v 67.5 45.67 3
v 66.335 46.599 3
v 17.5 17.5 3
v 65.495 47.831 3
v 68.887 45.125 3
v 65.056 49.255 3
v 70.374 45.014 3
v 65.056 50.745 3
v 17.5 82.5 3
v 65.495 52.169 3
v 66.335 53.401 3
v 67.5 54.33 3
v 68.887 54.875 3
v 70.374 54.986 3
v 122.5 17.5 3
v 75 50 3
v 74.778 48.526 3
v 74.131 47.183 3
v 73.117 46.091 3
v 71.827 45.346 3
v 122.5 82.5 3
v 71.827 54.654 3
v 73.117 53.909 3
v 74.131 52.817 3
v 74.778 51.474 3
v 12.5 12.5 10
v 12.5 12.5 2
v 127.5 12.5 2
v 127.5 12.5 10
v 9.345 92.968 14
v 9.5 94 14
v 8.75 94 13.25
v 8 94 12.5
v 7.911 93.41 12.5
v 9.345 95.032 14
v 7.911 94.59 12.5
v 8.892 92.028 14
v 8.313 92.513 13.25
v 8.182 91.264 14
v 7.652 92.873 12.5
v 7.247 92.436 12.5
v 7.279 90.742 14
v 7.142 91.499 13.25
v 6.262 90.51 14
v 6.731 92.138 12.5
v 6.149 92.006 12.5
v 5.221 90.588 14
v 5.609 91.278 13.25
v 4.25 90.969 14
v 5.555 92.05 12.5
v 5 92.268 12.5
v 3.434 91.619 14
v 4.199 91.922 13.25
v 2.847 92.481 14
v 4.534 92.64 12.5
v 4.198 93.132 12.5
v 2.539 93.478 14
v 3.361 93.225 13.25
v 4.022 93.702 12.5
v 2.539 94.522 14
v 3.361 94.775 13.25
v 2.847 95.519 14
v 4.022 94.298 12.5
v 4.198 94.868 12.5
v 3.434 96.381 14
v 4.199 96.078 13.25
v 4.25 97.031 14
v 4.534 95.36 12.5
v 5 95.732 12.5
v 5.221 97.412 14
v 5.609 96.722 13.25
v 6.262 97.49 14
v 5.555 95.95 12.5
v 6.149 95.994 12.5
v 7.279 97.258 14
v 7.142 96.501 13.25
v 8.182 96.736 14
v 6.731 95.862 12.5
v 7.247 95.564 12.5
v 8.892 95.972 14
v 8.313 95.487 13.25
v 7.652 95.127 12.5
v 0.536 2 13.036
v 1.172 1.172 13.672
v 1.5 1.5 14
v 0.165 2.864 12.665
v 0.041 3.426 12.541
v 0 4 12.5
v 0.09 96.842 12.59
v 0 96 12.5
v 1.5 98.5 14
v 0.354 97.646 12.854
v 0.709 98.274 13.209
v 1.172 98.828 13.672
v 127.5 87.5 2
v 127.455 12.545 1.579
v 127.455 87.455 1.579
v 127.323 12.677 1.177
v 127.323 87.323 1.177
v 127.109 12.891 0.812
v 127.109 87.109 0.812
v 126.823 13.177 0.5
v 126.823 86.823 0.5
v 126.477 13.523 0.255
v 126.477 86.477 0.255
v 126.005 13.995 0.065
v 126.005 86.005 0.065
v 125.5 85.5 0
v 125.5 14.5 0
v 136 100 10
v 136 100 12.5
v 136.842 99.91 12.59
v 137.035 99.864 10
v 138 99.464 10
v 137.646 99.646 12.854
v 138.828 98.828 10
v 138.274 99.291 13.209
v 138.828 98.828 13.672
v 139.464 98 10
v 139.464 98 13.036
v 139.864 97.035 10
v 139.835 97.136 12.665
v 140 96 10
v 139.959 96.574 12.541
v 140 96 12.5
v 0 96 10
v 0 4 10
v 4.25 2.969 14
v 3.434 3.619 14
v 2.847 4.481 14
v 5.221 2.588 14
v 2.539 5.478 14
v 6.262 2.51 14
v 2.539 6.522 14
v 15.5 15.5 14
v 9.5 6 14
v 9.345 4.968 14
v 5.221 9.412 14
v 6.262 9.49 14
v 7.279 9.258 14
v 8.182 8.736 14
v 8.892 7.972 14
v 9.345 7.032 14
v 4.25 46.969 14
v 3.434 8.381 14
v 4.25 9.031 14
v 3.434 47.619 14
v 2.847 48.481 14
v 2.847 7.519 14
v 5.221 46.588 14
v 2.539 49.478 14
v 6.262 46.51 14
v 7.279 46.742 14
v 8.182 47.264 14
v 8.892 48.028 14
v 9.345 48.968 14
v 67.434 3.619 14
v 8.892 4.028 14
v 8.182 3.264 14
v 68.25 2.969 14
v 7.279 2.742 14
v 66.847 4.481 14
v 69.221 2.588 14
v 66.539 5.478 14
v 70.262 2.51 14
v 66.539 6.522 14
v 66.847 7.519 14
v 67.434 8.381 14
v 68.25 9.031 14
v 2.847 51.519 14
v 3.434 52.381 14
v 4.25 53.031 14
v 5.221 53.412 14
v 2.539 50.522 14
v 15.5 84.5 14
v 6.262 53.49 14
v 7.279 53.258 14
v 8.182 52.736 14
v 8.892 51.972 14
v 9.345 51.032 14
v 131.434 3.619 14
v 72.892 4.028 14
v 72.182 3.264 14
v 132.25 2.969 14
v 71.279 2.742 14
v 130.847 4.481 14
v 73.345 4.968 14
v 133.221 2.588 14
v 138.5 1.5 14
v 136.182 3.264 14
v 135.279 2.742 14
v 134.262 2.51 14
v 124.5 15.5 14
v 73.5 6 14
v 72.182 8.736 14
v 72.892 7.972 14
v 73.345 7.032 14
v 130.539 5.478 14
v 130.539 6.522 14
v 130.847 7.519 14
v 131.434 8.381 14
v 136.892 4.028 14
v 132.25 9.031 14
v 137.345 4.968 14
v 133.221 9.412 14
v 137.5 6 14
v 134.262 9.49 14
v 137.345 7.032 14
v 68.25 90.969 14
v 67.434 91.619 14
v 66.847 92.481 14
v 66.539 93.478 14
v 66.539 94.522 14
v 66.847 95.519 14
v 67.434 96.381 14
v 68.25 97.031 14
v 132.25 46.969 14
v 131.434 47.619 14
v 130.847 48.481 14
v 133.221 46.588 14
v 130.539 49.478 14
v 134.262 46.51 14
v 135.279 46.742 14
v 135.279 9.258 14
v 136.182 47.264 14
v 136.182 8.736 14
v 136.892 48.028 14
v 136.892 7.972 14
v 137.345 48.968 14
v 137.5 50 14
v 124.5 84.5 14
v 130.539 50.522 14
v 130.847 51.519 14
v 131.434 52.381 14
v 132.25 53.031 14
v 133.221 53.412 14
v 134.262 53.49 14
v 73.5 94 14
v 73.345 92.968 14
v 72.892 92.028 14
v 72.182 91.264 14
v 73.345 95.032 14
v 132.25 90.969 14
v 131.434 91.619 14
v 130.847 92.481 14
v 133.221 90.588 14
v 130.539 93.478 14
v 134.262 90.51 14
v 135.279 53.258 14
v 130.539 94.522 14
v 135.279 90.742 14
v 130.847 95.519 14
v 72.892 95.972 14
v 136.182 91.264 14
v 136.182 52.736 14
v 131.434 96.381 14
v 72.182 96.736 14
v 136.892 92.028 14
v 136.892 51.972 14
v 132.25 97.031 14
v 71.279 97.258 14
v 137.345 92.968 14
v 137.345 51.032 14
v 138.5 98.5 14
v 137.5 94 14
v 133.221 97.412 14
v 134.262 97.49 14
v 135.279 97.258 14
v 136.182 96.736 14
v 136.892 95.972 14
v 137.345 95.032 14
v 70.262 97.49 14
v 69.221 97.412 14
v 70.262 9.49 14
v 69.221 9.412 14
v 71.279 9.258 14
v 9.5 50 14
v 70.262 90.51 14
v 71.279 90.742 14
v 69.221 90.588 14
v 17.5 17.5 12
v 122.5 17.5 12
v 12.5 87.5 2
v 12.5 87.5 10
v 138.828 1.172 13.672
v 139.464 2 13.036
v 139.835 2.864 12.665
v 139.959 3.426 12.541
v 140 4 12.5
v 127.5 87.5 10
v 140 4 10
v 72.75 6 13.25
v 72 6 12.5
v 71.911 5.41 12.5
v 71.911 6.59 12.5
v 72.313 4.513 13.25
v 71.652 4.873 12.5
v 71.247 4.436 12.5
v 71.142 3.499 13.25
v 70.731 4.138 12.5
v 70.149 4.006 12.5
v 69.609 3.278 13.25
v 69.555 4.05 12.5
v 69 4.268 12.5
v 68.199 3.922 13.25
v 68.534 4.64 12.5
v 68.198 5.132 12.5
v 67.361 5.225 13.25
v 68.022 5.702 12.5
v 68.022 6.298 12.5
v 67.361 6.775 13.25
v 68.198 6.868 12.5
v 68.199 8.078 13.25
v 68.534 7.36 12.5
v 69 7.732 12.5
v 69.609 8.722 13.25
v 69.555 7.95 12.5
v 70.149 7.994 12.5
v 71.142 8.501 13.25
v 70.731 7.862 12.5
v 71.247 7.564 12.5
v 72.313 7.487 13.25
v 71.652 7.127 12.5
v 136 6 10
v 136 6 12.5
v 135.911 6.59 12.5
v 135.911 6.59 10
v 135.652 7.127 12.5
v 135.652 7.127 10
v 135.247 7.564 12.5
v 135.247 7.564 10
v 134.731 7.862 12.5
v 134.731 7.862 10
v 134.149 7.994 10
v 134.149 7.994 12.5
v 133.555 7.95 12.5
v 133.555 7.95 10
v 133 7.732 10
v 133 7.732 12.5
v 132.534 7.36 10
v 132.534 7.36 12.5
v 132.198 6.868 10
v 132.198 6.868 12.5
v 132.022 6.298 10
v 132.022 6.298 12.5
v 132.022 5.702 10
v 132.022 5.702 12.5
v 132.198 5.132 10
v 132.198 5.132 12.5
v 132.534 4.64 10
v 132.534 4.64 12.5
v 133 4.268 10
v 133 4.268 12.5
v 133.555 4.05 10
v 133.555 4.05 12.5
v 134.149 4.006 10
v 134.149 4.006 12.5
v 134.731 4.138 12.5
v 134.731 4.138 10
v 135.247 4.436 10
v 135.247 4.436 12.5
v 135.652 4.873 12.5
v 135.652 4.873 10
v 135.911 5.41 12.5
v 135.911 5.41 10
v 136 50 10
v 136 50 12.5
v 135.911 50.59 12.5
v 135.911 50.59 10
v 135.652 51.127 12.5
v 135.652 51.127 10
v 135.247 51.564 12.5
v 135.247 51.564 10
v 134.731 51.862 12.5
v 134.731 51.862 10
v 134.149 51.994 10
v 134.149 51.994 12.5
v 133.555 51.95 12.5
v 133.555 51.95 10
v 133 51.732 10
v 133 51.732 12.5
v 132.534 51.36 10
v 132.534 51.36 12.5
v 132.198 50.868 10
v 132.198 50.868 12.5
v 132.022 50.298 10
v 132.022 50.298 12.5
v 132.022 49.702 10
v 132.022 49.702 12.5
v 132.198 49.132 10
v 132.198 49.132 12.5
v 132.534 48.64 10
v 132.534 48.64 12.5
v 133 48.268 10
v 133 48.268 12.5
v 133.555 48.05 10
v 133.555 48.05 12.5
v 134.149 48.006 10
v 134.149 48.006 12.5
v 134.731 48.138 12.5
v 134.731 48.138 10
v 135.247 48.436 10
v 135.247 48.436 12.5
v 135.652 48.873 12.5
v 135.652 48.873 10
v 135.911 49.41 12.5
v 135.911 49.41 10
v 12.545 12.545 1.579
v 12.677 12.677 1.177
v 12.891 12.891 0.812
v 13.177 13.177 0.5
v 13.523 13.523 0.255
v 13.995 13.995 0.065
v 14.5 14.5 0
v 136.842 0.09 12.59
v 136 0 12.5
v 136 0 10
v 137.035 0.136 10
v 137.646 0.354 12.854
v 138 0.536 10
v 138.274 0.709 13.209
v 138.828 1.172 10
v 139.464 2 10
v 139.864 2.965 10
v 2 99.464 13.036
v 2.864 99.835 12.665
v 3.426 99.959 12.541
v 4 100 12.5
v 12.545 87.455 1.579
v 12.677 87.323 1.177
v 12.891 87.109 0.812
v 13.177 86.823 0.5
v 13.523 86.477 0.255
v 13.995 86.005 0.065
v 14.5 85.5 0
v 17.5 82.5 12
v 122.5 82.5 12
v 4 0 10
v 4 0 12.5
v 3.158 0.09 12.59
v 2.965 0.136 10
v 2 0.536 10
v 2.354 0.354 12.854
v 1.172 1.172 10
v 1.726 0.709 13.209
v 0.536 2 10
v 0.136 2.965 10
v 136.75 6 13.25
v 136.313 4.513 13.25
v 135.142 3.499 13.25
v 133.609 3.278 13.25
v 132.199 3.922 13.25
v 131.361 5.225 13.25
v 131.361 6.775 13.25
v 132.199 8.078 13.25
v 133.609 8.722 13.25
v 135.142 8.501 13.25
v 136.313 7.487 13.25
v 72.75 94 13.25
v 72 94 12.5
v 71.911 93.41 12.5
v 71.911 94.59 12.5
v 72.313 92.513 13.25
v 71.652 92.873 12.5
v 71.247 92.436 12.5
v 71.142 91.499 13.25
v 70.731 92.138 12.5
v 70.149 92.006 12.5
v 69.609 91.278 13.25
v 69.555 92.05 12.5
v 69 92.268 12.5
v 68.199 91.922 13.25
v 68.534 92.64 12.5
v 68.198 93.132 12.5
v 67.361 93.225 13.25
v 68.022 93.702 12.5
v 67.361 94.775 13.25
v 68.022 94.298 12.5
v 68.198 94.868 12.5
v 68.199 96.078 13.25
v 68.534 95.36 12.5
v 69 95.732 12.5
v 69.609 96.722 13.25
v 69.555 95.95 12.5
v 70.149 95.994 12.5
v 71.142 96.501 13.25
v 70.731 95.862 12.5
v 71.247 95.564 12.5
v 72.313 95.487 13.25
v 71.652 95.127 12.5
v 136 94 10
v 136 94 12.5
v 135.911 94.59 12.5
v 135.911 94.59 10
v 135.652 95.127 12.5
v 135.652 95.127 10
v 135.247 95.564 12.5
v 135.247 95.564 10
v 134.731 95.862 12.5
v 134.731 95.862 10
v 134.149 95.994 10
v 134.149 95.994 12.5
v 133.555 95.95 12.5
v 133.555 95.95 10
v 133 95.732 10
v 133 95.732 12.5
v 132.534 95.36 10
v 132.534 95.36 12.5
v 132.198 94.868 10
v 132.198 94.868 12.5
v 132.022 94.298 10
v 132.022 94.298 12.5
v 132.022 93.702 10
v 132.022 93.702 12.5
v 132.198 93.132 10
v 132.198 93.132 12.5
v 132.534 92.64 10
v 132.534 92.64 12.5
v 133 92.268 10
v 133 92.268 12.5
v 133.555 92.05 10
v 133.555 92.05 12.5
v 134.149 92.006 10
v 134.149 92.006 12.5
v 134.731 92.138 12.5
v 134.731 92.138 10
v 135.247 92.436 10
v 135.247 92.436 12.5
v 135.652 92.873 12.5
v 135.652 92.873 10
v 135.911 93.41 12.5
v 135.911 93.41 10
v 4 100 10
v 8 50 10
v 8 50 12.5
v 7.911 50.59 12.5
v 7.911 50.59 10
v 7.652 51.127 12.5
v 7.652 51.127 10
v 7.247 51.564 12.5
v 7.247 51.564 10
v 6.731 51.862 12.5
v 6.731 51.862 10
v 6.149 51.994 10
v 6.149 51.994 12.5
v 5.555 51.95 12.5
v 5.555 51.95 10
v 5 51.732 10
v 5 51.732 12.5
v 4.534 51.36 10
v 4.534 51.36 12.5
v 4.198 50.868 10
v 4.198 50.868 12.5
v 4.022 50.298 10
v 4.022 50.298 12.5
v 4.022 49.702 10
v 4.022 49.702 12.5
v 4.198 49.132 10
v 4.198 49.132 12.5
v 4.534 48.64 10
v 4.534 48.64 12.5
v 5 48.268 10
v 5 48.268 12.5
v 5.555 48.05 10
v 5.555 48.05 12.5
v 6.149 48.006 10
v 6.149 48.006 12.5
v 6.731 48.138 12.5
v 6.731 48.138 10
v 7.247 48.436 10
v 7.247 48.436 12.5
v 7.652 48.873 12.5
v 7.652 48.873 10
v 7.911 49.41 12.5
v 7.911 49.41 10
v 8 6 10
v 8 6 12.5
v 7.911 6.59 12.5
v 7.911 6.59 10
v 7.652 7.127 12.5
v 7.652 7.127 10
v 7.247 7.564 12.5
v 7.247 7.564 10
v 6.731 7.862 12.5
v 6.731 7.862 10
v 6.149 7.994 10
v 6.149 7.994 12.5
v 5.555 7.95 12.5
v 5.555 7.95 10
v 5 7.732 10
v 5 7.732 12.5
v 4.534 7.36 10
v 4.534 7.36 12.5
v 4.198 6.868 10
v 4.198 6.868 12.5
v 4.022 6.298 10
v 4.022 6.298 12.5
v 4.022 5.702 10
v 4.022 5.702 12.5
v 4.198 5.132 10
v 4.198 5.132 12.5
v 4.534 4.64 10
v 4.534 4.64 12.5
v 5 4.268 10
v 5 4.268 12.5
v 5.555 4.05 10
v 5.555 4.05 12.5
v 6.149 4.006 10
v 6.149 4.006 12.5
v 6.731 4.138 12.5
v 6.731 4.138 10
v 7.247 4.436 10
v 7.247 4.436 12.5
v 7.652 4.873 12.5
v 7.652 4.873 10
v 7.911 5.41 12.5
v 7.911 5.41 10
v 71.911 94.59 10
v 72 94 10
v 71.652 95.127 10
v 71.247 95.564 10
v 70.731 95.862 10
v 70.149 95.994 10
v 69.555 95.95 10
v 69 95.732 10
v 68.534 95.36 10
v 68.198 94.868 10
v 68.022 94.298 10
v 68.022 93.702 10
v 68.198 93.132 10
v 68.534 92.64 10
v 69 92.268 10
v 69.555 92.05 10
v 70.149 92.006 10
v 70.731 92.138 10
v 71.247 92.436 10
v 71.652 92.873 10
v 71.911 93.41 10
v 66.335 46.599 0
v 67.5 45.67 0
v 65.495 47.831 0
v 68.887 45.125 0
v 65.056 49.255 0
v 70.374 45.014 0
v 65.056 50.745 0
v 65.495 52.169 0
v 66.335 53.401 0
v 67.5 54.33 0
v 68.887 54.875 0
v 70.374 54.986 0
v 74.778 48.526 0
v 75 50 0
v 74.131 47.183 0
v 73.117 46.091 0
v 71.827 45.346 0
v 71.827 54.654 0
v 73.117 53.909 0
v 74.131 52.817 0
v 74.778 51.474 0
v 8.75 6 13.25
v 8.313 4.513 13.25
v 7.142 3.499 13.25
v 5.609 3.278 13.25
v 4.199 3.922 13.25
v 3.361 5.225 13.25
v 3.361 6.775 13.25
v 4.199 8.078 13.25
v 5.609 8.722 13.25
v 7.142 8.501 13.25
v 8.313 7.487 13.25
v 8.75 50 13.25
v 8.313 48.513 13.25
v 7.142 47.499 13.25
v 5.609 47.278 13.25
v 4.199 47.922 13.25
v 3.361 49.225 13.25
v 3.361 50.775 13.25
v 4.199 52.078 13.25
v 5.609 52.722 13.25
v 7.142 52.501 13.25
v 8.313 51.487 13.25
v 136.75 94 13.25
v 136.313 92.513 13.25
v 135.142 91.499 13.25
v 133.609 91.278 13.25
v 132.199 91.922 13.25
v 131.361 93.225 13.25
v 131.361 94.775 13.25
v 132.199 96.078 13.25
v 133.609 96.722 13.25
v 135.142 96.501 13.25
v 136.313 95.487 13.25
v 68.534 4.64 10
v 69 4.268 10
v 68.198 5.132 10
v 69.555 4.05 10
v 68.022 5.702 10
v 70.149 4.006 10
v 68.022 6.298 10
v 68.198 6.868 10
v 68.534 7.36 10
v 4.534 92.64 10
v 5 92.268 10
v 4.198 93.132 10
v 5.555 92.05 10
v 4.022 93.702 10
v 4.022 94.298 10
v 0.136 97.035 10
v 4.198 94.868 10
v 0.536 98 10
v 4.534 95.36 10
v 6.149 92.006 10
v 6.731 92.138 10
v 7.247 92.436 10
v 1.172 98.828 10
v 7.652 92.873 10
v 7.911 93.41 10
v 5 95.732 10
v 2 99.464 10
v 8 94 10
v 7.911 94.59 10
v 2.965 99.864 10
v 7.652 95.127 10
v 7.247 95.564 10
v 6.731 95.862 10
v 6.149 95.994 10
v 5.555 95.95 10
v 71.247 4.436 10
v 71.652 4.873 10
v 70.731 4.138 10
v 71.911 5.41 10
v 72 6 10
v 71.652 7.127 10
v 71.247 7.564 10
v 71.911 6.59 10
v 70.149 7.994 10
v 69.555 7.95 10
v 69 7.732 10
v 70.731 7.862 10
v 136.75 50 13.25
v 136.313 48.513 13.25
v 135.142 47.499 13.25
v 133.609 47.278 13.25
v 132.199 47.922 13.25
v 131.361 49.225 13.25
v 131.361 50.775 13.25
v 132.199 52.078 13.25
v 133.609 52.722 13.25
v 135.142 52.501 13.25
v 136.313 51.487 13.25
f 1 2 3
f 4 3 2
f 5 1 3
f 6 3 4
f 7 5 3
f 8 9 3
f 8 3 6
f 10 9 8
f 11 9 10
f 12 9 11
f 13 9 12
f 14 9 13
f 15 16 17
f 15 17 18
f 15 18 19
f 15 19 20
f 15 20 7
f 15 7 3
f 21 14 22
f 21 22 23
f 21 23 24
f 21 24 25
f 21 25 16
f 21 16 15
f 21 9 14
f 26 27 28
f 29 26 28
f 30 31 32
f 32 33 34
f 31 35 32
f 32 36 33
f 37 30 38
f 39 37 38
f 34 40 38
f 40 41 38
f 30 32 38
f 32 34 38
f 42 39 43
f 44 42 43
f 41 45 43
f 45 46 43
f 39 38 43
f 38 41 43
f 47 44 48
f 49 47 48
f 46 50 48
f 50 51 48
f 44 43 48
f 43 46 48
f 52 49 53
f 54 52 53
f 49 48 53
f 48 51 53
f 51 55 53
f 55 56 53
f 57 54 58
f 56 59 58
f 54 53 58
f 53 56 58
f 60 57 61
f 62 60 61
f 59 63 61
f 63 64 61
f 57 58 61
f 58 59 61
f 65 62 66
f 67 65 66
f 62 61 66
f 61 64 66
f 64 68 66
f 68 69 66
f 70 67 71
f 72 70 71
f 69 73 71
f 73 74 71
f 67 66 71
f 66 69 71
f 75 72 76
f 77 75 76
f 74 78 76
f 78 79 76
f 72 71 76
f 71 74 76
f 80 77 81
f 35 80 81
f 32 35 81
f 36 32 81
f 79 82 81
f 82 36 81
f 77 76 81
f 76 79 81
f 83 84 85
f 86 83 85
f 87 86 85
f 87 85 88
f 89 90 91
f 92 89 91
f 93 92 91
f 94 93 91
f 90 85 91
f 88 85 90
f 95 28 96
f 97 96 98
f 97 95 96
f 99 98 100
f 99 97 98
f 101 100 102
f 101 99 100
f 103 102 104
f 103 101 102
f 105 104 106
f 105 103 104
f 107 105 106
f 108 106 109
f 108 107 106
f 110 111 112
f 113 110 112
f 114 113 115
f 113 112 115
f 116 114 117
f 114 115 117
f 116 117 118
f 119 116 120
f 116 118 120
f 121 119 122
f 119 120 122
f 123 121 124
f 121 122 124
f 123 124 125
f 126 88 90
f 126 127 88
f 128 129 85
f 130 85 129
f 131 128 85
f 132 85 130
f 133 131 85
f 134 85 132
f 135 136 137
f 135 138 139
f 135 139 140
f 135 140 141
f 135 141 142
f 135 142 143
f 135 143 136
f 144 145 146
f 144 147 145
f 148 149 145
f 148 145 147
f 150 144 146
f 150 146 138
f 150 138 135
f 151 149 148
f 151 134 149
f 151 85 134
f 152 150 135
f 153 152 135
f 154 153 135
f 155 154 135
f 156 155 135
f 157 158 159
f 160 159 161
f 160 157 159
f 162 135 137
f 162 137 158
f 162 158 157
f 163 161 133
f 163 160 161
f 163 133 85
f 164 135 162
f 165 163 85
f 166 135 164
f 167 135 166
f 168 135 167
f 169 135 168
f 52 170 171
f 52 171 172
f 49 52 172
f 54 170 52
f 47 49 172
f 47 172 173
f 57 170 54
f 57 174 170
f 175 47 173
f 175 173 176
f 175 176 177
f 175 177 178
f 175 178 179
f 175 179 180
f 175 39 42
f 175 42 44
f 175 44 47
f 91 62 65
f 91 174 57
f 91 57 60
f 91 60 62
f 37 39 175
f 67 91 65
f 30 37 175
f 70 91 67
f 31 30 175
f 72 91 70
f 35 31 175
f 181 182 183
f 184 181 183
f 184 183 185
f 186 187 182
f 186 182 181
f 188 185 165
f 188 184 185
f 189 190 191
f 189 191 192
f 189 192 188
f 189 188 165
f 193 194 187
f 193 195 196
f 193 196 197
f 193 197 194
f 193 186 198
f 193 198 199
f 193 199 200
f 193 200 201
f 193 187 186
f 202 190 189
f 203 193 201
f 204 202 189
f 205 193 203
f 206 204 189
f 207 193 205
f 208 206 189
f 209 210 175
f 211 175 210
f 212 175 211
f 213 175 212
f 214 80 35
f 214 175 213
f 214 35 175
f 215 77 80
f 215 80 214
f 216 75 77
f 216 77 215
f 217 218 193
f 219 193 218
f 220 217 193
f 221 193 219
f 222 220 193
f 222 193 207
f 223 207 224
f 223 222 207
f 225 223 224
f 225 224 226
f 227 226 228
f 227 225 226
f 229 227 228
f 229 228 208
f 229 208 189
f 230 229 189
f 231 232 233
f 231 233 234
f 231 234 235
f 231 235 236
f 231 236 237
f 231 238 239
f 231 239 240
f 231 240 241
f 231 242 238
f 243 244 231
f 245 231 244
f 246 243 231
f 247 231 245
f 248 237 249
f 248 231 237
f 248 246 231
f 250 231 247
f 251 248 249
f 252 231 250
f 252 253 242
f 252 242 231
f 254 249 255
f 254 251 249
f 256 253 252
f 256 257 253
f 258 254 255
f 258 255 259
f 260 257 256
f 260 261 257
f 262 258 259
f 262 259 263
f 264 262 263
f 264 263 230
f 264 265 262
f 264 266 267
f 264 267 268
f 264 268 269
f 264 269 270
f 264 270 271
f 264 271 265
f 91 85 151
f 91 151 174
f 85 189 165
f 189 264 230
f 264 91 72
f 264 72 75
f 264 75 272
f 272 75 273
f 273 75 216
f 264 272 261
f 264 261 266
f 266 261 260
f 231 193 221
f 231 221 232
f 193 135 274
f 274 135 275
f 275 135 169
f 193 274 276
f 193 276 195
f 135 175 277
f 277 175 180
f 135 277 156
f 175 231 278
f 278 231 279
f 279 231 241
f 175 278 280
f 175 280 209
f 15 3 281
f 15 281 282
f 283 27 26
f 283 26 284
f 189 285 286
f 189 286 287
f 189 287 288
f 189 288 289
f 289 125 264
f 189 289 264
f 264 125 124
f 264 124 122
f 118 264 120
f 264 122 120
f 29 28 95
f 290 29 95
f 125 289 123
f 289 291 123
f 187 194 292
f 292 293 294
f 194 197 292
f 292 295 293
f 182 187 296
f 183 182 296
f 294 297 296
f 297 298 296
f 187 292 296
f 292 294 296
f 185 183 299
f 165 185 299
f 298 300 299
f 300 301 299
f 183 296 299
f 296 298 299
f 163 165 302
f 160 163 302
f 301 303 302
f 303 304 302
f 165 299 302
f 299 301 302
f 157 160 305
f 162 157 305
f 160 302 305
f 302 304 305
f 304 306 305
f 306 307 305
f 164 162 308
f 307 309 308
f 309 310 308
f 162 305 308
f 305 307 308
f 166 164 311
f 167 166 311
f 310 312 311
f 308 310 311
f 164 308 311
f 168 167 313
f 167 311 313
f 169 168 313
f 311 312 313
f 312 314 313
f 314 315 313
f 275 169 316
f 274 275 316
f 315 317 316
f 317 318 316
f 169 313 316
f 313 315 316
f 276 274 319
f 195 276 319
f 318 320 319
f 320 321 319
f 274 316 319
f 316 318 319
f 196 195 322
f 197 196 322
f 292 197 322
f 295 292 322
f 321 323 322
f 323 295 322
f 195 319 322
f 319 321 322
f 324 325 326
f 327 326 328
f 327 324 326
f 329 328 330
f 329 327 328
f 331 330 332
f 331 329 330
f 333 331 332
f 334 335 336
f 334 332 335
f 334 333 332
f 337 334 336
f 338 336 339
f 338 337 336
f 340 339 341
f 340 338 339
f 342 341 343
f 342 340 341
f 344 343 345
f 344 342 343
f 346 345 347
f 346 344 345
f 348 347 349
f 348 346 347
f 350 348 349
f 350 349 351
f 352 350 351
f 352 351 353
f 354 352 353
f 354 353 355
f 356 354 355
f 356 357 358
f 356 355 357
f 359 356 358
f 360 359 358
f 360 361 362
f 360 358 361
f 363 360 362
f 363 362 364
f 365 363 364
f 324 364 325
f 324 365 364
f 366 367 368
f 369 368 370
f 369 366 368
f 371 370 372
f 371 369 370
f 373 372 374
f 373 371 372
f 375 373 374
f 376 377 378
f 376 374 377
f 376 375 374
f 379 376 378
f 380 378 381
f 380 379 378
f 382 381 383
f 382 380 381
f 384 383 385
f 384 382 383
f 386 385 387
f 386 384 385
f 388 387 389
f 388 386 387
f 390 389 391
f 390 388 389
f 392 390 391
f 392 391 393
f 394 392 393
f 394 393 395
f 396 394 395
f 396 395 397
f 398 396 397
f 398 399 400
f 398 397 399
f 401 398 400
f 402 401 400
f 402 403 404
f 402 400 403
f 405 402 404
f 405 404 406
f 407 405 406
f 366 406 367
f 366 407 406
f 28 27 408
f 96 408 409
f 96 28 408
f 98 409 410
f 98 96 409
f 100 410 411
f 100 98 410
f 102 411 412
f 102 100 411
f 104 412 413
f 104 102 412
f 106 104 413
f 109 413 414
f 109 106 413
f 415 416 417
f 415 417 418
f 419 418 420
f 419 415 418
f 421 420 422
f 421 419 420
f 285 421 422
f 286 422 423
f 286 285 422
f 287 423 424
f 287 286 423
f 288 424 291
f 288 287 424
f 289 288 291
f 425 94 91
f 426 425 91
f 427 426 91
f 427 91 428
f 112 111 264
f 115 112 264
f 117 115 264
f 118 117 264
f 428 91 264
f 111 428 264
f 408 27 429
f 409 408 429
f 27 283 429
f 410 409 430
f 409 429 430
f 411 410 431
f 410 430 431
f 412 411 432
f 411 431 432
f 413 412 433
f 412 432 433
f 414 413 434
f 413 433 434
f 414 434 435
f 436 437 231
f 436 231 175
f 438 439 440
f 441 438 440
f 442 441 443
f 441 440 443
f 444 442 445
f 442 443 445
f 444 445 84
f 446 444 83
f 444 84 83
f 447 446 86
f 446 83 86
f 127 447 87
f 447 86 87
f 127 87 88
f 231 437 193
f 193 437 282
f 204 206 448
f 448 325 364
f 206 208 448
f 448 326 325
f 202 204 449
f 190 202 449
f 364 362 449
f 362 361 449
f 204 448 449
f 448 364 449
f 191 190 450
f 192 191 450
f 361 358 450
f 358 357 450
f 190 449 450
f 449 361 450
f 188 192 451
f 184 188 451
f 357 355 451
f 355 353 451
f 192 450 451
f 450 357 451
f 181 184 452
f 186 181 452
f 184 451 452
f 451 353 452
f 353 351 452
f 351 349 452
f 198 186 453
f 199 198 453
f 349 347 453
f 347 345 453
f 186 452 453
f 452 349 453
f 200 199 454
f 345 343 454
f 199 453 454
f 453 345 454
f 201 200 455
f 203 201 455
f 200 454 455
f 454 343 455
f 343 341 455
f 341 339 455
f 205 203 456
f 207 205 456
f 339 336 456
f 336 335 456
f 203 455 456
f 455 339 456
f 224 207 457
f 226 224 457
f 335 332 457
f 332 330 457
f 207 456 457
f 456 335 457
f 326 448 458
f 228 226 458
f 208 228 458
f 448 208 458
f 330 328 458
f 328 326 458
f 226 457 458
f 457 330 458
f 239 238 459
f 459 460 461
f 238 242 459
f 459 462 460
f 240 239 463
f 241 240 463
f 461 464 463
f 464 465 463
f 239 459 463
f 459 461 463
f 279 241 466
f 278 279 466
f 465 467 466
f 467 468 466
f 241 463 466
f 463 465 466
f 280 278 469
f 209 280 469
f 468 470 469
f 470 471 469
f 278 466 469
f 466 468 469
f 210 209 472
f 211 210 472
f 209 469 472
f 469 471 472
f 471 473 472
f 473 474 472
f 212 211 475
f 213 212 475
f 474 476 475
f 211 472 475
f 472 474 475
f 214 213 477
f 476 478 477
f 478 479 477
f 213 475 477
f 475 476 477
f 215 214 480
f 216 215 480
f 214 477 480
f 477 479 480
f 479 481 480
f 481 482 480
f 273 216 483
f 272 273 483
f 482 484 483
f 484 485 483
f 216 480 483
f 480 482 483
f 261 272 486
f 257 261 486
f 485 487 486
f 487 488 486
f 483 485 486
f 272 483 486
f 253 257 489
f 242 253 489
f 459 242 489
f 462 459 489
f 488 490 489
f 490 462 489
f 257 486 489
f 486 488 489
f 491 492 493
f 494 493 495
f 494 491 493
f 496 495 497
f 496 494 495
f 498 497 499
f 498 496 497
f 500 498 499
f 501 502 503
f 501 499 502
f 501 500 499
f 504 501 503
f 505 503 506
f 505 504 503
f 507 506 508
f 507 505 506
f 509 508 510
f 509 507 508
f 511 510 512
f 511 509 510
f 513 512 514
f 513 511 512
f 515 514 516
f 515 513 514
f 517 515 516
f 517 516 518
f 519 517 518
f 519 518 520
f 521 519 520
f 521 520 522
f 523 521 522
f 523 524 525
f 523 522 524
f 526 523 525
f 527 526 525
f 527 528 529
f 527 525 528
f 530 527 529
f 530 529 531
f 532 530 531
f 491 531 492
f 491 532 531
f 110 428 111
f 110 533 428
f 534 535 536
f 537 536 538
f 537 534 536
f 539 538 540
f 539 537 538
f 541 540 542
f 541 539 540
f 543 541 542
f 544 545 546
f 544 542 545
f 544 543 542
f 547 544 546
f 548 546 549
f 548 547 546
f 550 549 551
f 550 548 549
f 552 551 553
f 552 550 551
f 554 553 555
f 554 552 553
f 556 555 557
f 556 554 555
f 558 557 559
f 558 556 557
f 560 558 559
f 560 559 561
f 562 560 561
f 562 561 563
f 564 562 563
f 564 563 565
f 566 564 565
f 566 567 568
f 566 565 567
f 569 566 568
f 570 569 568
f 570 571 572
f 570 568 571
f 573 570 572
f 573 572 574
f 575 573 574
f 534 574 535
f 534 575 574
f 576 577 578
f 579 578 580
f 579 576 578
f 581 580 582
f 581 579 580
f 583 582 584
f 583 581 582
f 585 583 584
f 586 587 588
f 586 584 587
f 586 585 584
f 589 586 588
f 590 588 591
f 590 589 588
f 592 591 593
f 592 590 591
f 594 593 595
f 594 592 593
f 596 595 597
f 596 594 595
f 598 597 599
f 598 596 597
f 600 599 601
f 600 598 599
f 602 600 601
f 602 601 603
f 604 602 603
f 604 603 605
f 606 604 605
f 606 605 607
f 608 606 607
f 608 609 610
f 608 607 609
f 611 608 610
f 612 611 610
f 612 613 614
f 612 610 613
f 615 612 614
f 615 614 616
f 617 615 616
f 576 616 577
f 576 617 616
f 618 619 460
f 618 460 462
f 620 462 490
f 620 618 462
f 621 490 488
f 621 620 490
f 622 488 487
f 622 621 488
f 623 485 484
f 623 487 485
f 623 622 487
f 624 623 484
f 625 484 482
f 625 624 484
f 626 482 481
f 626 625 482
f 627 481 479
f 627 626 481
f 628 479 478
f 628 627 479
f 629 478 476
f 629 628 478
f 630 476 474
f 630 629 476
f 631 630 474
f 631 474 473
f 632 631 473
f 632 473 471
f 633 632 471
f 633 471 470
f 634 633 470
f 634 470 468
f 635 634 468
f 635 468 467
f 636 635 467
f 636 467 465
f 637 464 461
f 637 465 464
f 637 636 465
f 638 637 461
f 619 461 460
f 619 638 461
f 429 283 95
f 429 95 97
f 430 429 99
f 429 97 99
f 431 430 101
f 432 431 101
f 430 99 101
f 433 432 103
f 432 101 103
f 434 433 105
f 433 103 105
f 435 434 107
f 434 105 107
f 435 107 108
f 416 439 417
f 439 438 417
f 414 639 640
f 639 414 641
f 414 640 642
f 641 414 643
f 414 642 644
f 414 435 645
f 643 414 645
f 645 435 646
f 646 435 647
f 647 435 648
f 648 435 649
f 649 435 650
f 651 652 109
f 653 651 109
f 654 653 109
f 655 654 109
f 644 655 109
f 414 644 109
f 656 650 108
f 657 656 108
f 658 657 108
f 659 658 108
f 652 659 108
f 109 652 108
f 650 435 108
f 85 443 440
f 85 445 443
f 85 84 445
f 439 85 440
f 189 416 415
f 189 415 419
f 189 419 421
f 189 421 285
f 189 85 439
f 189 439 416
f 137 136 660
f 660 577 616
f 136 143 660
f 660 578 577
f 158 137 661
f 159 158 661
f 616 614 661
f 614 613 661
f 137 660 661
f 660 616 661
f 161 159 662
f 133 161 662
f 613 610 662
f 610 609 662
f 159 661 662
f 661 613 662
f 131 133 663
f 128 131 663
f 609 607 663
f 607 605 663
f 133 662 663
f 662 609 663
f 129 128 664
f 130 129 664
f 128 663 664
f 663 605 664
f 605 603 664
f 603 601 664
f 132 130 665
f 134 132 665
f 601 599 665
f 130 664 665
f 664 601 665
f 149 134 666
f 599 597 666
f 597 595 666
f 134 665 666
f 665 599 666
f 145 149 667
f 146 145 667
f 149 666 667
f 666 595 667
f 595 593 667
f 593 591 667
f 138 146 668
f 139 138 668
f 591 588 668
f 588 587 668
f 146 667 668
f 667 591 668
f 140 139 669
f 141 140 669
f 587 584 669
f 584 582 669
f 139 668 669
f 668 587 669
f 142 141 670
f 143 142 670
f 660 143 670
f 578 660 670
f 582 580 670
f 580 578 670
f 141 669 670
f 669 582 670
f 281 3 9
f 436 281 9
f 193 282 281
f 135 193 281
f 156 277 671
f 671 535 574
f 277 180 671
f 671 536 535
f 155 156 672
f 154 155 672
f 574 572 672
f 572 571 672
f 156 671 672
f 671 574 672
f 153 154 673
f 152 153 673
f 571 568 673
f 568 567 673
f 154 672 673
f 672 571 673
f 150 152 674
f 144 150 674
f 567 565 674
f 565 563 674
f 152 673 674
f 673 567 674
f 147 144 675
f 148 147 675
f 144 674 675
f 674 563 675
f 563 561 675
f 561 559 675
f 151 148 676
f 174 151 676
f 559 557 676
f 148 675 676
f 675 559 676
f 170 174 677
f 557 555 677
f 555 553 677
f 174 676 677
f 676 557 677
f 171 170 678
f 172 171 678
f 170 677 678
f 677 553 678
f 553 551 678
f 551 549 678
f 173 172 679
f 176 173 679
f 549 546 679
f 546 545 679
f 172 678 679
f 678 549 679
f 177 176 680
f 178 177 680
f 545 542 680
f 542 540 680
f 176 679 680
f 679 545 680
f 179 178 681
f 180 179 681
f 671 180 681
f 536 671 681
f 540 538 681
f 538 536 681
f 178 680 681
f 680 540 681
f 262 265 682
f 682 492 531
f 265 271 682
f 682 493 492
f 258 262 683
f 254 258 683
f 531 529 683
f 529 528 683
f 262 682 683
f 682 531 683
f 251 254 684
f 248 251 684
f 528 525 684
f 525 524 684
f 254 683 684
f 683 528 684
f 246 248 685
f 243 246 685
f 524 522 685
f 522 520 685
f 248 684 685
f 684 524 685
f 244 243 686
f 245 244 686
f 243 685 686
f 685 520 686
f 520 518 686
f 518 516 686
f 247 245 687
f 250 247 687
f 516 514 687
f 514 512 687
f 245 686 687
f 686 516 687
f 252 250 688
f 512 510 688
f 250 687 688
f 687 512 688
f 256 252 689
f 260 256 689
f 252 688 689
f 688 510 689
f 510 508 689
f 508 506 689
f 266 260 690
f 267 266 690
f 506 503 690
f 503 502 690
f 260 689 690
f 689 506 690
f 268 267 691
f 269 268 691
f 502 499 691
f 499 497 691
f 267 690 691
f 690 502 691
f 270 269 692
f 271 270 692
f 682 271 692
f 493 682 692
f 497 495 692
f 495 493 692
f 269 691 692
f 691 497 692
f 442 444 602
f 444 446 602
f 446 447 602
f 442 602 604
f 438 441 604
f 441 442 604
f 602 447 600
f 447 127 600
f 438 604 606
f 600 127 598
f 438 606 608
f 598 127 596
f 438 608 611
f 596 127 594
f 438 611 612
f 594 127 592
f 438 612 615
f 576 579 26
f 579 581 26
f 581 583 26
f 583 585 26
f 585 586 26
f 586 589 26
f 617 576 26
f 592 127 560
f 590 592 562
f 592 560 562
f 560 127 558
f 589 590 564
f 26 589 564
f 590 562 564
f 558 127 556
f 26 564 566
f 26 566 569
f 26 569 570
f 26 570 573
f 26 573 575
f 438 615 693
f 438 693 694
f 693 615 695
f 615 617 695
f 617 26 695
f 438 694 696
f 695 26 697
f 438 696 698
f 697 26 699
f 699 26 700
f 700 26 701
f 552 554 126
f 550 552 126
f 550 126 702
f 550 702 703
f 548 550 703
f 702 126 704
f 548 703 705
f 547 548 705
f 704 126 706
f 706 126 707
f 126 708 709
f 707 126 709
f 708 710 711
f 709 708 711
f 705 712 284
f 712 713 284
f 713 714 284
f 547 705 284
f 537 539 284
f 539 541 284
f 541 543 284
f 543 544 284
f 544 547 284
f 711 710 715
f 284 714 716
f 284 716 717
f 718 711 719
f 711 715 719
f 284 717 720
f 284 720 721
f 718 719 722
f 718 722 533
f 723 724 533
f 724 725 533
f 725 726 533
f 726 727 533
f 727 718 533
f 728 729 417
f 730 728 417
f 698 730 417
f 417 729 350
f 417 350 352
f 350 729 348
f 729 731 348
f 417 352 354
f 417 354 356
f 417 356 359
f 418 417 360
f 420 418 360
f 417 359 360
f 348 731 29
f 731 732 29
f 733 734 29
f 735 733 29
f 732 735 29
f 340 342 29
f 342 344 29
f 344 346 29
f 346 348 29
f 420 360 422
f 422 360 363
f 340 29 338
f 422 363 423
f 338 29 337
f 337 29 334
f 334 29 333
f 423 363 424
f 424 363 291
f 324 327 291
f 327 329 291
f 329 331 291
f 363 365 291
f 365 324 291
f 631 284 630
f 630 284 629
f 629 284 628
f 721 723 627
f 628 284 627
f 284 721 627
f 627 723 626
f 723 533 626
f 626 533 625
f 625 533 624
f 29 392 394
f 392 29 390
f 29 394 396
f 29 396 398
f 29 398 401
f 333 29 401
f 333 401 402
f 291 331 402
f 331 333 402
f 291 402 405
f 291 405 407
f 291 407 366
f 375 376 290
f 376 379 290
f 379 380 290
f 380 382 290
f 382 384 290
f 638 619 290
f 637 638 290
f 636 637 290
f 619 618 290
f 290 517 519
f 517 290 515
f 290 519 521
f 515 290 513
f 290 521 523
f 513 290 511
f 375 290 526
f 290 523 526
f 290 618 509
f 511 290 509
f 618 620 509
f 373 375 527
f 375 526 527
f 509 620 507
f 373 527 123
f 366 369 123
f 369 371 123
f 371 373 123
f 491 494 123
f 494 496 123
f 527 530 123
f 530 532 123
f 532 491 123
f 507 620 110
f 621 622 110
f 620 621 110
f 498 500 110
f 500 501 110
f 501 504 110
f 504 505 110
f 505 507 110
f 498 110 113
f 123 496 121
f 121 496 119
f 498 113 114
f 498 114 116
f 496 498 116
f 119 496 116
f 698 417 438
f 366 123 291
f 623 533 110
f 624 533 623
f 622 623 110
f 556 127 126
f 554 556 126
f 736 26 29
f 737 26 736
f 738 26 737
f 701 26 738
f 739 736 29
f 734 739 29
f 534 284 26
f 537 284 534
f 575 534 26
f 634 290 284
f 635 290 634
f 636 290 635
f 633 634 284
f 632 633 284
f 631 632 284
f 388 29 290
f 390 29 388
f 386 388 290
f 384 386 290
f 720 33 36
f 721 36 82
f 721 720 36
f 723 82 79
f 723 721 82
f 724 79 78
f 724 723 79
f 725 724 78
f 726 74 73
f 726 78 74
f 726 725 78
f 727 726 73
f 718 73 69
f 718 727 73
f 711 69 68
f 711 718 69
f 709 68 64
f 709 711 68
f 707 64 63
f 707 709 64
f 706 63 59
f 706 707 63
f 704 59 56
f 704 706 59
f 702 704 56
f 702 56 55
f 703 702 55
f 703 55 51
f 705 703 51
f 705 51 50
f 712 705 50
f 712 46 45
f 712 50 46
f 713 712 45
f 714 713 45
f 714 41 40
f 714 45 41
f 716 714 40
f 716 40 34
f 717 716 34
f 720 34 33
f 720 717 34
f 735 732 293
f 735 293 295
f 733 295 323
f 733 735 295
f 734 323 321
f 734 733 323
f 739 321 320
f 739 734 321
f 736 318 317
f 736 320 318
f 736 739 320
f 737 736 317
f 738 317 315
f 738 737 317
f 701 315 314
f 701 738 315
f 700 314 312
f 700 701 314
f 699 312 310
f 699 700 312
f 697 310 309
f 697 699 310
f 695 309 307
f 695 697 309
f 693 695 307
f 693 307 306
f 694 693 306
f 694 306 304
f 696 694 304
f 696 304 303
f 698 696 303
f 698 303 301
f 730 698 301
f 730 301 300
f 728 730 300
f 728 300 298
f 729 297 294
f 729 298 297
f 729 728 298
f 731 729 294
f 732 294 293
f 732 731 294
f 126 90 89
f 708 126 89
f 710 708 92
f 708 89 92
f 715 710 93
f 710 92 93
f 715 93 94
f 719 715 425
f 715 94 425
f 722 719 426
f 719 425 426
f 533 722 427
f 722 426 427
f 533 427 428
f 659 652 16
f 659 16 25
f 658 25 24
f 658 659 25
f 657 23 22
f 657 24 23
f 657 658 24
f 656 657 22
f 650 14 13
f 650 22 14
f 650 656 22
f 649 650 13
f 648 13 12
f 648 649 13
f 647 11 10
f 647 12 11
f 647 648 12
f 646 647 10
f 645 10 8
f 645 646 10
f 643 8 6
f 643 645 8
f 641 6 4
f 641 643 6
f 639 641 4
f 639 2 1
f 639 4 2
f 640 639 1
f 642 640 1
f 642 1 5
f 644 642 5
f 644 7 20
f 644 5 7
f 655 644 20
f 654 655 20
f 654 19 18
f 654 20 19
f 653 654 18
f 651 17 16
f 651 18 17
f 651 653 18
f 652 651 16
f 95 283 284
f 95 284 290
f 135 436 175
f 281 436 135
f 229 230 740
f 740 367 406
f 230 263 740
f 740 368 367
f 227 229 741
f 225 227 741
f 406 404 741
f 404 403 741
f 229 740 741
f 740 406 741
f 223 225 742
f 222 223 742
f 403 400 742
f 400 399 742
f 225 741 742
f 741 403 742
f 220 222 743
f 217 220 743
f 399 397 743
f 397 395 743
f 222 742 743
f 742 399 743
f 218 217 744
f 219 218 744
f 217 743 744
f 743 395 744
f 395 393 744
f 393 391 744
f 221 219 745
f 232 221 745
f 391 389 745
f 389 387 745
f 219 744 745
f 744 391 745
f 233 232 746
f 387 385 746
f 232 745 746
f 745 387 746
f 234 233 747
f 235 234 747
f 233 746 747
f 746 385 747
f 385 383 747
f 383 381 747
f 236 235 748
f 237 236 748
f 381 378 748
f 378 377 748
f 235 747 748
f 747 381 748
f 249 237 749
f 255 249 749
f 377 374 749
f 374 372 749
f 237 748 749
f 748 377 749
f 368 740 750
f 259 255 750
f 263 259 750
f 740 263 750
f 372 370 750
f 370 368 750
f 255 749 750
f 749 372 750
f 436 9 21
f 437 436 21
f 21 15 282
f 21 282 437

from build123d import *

# Parameters (mm, degrees)
CYLINDER008_R     = 2
CYLINDER008_DEPTH = 20
CYLINDER007_R     = 2
CYLINDER007_DEPTH = 20
CYLINDER006_R     = 5
CYLINDER006_DEPTH = 20
BOX002_W          = 105
BOX002_H          = 65
BOX002_DEPTH      = 20
BOX001_W          = 115
BOX001_H          = 75
BOX001_DEPTH      = 10
FILLET_R          = 2
CYLINDER003_R     = 2
CYLINDER003_DEPTH = 10
CYLINDER002_R     = 2
CYLINDER002_DEPTH = 10
CYLINDER004_R     = 2
CYLINDER004_DEPTH = 10
CYLINDER005_R     = 2
CYLINDER005_DEPTH = 10
CYLINDER001_R     = 2
CYLINDER001_DEPTH = 10
CYLINDER_R        = 2
CYLINDER_DEPTH    = 10
BOX_W             = 140
BOX_H             = 100
BOX_DEPTH         = 4
CHAMFER_SIZE      = 1.5
CHAMFER001_SIZE   = 2
FILLET001_R       = 4
FILLET002_R       = 4
CHAMFER002_SIZE   = 1.5


with BuildPart() as cylinder008:
    # Cylinder008 → Cylinder008 (new body)
    with BuildSketch(Plane(origin=(70, 6, 0), x_dir=(1, 0, 0), z_dir=(0, 0, 1))):
        Circle(CYLINDER008_R)
    extrude(amount=CYLINDER008_DEPTH)


with BuildPart() as cylinder007:
    # Cylinder007 → Cylinder007 (new body)
    with BuildSketch(Plane(origin=(70, 94, 0), x_dir=(1, 0, 0), z_dir=(0, 0, 1))):
        Circle(CYLINDER007_R)
    extrude(amount=CYLINDER007_DEPTH)


with BuildPart() as cylinder006:
    # Cylinder006 → Cylinder006 (new body)
    with BuildSketch(Plane(origin=(70, 50, -5), x_dir=(1, 0, 0), z_dir=(0, 0, 1))):
        Circle(CYLINDER006_R)
    extrude(amount=CYLINDER006_DEPTH)


with BuildPart() as cube002:
    # Box002 → Box002 (new body)
    with BuildSketch(Plane(origin=(17.5, 17.5, 3), x_dir=(1, 0, 0), z_dir=(0, 0, 1))):
        with Locations((52.5, 32.5)):
            Rectangle(BOX002_W, BOX002_H)
    extrude(amount=BOX002_DEPTH)


with BuildPart() as fillet_body:
    # Box001 → Box001 (new body)
    with BuildSketch(Plane(origin=(12.5, 12.5, 0), x_dir=(1, 0, 0), z_dir=(0, 0, 1))):
        with Locations((57.5, 37.5)):
            Rectangle(BOX001_W, BOX001_H)
    extrude(amount=BOX001_DEPTH)

    # Fillet
    fillet_edges = [fillet_body.edges().sort_by_distance(p)[0] for p in [
        (12.5, 50, 0),
        (127.5, 50, 0),
        (70, 12.5, 0),
        (70, 87.5, 0),
    ]]
    fillet(fillet_edges, radius=FILLET_R)


with BuildPart() as cylinder003:
    # Cylinder003 → Cylinder003 (new body)
    with BuildSketch(Plane(origin=(6, 94, 0), x_dir=(1, 0, 0), z_dir=(0, 0, 1))):
        Circle(CYLINDER003_R)
    extrude(amount=CYLINDER003_DEPTH)


with BuildPart() as cylinder002:
    # Cylinder002 → Cylinder002 (new body)
    with BuildSketch(Plane(origin=(6, 50, 0), x_dir=(1, 0, 0), z_dir=(0, 0, 1))):
        Circle(CYLINDER002_R)
    extrude(amount=CYLINDER002_DEPTH)


with BuildPart() as cylinder004:
    # Cylinder004 → Cylinder004 (new body)
    with BuildSketch(Plane(origin=(6, 6, 0), x_dir=(1, 0, 0), z_dir=(0, 0, 1))):
        Circle(CYLINDER004_R)
    extrude(amount=CYLINDER004_DEPTH)


with BuildPart() as cylinder005:
    # Cylinder005 → Cylinder005 (new body)
    with BuildSketch(Plane(origin=(134, 94, 0), x_dir=(1, 0, 0), z_dir=(0, 0, 1))):
        Circle(CYLINDER005_R)
    extrude(amount=CYLINDER005_DEPTH)


with BuildPart() as cylinder001:
    # Cylinder001 → Cylinder001 (new body)
    with BuildSketch(Plane(origin=(134, 50, 0), x_dir=(1, 0, 0), z_dir=(0, 0, 1))):
        Circle(CYLINDER001_R)
    extrude(amount=CYLINDER001_DEPTH)


with BuildPart() as cylinder:
    # Cylinder → Cylinder (new body)
    with BuildSketch(Plane(origin=(134, 6, 0), x_dir=(1, 0, 0), z_dir=(0, 0, 1))):
        Circle(CYLINDER_R)
    extrude(amount=CYLINDER_DEPTH)


with BuildPart() as chamfer002:
    # Box → Box (new body)
    with BuildSketch(Plane.XY):
        with Locations((70, 50)):
            Rectangle(BOX_W, BOX_H)
    extrude(amount=BOX_DEPTH)

    # Cut: cut Cylinder
    add(cylinder.part, mode=Mode.SUBTRACT)

    # Cut001: cut Cylinder001
    add(cylinder001.part, mode=Mode.SUBTRACT)

    # Cut002: cut Cylinder005
    add(cylinder005.part, mode=Mode.SUBTRACT)

    # Cut003: cut Cylinder004
    add(cylinder004.part, mode=Mode.SUBTRACT)

    # Cut004: cut Cylinder002
    add(cylinder002.part, mode=Mode.SUBTRACT)

    # Cut005: cut Cylinder003
    add(cylinder003.part, mode=Mode.SUBTRACT)


with BuildPart() as chamfer002_1:
    # Cut005 placement: moved
    add(chamfer002.part.moved(Location((0, 0, 10))))

    # Chamfer
    chamfer_edges = [chamfer002_1.edges().sort_by_distance(p)[0] for p in [
        (4, 50, 14),
        (4, 6, 14),
        (0, 50, 14),
        (70, 100, 14),
        (70, 0, 14),
        (140, 50, 14),
        (4, 94, 14),
        (132, 94, 14),
        (132, 50, 14),
        (132, 6, 14),
    ]]
    chamfer(chamfer_edges, length=CHAMFER_SIZE)

    # Fusion: union Fillet body
    add(fillet_body.part)

    # Cut006: cut Cube002
    add(cube002.part, mode=Mode.SUBTRACT)

    # Cut007: cut Cylinder006
    add(cylinder006.part, mode=Mode.SUBTRACT)

    # Chamfer001
    chamfer001_edges = [chamfer002_1.edges().sort_by_distance(p)[0] for p in [
        (122.5, 50, 14),
        (70, 17.5, 14),
        (17.5, 50, 14),
        (70, 82.5, 14),
    ]]
    chamfer(chamfer001_edges, length=CHAMFER001_SIZE)

    # Fillet001
    fillet001_edges = [chamfer002_1.edges().sort_by_distance(p)[0] for p in [
        (140, 0, 11.25),
        (140, 100, 11.25),
    ]]
    fillet(fillet001_edges, radius=FILLET001_R)

    # Fillet002
    fillet002_edges = [chamfer002_1.edges().sort_by_distance(p)[0] for p in [
        (0, 0, 11.25),
        (0, 100, 11.25),
    ]]
    fillet(fillet002_edges, radius=FILLET002_R)

    # Cut008: cut Cylinder007
    add(cylinder007.part, mode=Mode.SUBTRACT)

    # Cut009: cut Cylinder008
    add(cylinder008.part, mode=Mode.SUBTRACT)

    # Chamfer002
    chamfer002_edges = [chamfer002_1.edges().sort_by_distance(p)[0] for p in [
        (68, 6, 14),
        (68, 94, 14),
    ]]
    chamfer(chamfer002_edges, length=CHAMFER002_SIZE)


solid = chamfer002_1.part
